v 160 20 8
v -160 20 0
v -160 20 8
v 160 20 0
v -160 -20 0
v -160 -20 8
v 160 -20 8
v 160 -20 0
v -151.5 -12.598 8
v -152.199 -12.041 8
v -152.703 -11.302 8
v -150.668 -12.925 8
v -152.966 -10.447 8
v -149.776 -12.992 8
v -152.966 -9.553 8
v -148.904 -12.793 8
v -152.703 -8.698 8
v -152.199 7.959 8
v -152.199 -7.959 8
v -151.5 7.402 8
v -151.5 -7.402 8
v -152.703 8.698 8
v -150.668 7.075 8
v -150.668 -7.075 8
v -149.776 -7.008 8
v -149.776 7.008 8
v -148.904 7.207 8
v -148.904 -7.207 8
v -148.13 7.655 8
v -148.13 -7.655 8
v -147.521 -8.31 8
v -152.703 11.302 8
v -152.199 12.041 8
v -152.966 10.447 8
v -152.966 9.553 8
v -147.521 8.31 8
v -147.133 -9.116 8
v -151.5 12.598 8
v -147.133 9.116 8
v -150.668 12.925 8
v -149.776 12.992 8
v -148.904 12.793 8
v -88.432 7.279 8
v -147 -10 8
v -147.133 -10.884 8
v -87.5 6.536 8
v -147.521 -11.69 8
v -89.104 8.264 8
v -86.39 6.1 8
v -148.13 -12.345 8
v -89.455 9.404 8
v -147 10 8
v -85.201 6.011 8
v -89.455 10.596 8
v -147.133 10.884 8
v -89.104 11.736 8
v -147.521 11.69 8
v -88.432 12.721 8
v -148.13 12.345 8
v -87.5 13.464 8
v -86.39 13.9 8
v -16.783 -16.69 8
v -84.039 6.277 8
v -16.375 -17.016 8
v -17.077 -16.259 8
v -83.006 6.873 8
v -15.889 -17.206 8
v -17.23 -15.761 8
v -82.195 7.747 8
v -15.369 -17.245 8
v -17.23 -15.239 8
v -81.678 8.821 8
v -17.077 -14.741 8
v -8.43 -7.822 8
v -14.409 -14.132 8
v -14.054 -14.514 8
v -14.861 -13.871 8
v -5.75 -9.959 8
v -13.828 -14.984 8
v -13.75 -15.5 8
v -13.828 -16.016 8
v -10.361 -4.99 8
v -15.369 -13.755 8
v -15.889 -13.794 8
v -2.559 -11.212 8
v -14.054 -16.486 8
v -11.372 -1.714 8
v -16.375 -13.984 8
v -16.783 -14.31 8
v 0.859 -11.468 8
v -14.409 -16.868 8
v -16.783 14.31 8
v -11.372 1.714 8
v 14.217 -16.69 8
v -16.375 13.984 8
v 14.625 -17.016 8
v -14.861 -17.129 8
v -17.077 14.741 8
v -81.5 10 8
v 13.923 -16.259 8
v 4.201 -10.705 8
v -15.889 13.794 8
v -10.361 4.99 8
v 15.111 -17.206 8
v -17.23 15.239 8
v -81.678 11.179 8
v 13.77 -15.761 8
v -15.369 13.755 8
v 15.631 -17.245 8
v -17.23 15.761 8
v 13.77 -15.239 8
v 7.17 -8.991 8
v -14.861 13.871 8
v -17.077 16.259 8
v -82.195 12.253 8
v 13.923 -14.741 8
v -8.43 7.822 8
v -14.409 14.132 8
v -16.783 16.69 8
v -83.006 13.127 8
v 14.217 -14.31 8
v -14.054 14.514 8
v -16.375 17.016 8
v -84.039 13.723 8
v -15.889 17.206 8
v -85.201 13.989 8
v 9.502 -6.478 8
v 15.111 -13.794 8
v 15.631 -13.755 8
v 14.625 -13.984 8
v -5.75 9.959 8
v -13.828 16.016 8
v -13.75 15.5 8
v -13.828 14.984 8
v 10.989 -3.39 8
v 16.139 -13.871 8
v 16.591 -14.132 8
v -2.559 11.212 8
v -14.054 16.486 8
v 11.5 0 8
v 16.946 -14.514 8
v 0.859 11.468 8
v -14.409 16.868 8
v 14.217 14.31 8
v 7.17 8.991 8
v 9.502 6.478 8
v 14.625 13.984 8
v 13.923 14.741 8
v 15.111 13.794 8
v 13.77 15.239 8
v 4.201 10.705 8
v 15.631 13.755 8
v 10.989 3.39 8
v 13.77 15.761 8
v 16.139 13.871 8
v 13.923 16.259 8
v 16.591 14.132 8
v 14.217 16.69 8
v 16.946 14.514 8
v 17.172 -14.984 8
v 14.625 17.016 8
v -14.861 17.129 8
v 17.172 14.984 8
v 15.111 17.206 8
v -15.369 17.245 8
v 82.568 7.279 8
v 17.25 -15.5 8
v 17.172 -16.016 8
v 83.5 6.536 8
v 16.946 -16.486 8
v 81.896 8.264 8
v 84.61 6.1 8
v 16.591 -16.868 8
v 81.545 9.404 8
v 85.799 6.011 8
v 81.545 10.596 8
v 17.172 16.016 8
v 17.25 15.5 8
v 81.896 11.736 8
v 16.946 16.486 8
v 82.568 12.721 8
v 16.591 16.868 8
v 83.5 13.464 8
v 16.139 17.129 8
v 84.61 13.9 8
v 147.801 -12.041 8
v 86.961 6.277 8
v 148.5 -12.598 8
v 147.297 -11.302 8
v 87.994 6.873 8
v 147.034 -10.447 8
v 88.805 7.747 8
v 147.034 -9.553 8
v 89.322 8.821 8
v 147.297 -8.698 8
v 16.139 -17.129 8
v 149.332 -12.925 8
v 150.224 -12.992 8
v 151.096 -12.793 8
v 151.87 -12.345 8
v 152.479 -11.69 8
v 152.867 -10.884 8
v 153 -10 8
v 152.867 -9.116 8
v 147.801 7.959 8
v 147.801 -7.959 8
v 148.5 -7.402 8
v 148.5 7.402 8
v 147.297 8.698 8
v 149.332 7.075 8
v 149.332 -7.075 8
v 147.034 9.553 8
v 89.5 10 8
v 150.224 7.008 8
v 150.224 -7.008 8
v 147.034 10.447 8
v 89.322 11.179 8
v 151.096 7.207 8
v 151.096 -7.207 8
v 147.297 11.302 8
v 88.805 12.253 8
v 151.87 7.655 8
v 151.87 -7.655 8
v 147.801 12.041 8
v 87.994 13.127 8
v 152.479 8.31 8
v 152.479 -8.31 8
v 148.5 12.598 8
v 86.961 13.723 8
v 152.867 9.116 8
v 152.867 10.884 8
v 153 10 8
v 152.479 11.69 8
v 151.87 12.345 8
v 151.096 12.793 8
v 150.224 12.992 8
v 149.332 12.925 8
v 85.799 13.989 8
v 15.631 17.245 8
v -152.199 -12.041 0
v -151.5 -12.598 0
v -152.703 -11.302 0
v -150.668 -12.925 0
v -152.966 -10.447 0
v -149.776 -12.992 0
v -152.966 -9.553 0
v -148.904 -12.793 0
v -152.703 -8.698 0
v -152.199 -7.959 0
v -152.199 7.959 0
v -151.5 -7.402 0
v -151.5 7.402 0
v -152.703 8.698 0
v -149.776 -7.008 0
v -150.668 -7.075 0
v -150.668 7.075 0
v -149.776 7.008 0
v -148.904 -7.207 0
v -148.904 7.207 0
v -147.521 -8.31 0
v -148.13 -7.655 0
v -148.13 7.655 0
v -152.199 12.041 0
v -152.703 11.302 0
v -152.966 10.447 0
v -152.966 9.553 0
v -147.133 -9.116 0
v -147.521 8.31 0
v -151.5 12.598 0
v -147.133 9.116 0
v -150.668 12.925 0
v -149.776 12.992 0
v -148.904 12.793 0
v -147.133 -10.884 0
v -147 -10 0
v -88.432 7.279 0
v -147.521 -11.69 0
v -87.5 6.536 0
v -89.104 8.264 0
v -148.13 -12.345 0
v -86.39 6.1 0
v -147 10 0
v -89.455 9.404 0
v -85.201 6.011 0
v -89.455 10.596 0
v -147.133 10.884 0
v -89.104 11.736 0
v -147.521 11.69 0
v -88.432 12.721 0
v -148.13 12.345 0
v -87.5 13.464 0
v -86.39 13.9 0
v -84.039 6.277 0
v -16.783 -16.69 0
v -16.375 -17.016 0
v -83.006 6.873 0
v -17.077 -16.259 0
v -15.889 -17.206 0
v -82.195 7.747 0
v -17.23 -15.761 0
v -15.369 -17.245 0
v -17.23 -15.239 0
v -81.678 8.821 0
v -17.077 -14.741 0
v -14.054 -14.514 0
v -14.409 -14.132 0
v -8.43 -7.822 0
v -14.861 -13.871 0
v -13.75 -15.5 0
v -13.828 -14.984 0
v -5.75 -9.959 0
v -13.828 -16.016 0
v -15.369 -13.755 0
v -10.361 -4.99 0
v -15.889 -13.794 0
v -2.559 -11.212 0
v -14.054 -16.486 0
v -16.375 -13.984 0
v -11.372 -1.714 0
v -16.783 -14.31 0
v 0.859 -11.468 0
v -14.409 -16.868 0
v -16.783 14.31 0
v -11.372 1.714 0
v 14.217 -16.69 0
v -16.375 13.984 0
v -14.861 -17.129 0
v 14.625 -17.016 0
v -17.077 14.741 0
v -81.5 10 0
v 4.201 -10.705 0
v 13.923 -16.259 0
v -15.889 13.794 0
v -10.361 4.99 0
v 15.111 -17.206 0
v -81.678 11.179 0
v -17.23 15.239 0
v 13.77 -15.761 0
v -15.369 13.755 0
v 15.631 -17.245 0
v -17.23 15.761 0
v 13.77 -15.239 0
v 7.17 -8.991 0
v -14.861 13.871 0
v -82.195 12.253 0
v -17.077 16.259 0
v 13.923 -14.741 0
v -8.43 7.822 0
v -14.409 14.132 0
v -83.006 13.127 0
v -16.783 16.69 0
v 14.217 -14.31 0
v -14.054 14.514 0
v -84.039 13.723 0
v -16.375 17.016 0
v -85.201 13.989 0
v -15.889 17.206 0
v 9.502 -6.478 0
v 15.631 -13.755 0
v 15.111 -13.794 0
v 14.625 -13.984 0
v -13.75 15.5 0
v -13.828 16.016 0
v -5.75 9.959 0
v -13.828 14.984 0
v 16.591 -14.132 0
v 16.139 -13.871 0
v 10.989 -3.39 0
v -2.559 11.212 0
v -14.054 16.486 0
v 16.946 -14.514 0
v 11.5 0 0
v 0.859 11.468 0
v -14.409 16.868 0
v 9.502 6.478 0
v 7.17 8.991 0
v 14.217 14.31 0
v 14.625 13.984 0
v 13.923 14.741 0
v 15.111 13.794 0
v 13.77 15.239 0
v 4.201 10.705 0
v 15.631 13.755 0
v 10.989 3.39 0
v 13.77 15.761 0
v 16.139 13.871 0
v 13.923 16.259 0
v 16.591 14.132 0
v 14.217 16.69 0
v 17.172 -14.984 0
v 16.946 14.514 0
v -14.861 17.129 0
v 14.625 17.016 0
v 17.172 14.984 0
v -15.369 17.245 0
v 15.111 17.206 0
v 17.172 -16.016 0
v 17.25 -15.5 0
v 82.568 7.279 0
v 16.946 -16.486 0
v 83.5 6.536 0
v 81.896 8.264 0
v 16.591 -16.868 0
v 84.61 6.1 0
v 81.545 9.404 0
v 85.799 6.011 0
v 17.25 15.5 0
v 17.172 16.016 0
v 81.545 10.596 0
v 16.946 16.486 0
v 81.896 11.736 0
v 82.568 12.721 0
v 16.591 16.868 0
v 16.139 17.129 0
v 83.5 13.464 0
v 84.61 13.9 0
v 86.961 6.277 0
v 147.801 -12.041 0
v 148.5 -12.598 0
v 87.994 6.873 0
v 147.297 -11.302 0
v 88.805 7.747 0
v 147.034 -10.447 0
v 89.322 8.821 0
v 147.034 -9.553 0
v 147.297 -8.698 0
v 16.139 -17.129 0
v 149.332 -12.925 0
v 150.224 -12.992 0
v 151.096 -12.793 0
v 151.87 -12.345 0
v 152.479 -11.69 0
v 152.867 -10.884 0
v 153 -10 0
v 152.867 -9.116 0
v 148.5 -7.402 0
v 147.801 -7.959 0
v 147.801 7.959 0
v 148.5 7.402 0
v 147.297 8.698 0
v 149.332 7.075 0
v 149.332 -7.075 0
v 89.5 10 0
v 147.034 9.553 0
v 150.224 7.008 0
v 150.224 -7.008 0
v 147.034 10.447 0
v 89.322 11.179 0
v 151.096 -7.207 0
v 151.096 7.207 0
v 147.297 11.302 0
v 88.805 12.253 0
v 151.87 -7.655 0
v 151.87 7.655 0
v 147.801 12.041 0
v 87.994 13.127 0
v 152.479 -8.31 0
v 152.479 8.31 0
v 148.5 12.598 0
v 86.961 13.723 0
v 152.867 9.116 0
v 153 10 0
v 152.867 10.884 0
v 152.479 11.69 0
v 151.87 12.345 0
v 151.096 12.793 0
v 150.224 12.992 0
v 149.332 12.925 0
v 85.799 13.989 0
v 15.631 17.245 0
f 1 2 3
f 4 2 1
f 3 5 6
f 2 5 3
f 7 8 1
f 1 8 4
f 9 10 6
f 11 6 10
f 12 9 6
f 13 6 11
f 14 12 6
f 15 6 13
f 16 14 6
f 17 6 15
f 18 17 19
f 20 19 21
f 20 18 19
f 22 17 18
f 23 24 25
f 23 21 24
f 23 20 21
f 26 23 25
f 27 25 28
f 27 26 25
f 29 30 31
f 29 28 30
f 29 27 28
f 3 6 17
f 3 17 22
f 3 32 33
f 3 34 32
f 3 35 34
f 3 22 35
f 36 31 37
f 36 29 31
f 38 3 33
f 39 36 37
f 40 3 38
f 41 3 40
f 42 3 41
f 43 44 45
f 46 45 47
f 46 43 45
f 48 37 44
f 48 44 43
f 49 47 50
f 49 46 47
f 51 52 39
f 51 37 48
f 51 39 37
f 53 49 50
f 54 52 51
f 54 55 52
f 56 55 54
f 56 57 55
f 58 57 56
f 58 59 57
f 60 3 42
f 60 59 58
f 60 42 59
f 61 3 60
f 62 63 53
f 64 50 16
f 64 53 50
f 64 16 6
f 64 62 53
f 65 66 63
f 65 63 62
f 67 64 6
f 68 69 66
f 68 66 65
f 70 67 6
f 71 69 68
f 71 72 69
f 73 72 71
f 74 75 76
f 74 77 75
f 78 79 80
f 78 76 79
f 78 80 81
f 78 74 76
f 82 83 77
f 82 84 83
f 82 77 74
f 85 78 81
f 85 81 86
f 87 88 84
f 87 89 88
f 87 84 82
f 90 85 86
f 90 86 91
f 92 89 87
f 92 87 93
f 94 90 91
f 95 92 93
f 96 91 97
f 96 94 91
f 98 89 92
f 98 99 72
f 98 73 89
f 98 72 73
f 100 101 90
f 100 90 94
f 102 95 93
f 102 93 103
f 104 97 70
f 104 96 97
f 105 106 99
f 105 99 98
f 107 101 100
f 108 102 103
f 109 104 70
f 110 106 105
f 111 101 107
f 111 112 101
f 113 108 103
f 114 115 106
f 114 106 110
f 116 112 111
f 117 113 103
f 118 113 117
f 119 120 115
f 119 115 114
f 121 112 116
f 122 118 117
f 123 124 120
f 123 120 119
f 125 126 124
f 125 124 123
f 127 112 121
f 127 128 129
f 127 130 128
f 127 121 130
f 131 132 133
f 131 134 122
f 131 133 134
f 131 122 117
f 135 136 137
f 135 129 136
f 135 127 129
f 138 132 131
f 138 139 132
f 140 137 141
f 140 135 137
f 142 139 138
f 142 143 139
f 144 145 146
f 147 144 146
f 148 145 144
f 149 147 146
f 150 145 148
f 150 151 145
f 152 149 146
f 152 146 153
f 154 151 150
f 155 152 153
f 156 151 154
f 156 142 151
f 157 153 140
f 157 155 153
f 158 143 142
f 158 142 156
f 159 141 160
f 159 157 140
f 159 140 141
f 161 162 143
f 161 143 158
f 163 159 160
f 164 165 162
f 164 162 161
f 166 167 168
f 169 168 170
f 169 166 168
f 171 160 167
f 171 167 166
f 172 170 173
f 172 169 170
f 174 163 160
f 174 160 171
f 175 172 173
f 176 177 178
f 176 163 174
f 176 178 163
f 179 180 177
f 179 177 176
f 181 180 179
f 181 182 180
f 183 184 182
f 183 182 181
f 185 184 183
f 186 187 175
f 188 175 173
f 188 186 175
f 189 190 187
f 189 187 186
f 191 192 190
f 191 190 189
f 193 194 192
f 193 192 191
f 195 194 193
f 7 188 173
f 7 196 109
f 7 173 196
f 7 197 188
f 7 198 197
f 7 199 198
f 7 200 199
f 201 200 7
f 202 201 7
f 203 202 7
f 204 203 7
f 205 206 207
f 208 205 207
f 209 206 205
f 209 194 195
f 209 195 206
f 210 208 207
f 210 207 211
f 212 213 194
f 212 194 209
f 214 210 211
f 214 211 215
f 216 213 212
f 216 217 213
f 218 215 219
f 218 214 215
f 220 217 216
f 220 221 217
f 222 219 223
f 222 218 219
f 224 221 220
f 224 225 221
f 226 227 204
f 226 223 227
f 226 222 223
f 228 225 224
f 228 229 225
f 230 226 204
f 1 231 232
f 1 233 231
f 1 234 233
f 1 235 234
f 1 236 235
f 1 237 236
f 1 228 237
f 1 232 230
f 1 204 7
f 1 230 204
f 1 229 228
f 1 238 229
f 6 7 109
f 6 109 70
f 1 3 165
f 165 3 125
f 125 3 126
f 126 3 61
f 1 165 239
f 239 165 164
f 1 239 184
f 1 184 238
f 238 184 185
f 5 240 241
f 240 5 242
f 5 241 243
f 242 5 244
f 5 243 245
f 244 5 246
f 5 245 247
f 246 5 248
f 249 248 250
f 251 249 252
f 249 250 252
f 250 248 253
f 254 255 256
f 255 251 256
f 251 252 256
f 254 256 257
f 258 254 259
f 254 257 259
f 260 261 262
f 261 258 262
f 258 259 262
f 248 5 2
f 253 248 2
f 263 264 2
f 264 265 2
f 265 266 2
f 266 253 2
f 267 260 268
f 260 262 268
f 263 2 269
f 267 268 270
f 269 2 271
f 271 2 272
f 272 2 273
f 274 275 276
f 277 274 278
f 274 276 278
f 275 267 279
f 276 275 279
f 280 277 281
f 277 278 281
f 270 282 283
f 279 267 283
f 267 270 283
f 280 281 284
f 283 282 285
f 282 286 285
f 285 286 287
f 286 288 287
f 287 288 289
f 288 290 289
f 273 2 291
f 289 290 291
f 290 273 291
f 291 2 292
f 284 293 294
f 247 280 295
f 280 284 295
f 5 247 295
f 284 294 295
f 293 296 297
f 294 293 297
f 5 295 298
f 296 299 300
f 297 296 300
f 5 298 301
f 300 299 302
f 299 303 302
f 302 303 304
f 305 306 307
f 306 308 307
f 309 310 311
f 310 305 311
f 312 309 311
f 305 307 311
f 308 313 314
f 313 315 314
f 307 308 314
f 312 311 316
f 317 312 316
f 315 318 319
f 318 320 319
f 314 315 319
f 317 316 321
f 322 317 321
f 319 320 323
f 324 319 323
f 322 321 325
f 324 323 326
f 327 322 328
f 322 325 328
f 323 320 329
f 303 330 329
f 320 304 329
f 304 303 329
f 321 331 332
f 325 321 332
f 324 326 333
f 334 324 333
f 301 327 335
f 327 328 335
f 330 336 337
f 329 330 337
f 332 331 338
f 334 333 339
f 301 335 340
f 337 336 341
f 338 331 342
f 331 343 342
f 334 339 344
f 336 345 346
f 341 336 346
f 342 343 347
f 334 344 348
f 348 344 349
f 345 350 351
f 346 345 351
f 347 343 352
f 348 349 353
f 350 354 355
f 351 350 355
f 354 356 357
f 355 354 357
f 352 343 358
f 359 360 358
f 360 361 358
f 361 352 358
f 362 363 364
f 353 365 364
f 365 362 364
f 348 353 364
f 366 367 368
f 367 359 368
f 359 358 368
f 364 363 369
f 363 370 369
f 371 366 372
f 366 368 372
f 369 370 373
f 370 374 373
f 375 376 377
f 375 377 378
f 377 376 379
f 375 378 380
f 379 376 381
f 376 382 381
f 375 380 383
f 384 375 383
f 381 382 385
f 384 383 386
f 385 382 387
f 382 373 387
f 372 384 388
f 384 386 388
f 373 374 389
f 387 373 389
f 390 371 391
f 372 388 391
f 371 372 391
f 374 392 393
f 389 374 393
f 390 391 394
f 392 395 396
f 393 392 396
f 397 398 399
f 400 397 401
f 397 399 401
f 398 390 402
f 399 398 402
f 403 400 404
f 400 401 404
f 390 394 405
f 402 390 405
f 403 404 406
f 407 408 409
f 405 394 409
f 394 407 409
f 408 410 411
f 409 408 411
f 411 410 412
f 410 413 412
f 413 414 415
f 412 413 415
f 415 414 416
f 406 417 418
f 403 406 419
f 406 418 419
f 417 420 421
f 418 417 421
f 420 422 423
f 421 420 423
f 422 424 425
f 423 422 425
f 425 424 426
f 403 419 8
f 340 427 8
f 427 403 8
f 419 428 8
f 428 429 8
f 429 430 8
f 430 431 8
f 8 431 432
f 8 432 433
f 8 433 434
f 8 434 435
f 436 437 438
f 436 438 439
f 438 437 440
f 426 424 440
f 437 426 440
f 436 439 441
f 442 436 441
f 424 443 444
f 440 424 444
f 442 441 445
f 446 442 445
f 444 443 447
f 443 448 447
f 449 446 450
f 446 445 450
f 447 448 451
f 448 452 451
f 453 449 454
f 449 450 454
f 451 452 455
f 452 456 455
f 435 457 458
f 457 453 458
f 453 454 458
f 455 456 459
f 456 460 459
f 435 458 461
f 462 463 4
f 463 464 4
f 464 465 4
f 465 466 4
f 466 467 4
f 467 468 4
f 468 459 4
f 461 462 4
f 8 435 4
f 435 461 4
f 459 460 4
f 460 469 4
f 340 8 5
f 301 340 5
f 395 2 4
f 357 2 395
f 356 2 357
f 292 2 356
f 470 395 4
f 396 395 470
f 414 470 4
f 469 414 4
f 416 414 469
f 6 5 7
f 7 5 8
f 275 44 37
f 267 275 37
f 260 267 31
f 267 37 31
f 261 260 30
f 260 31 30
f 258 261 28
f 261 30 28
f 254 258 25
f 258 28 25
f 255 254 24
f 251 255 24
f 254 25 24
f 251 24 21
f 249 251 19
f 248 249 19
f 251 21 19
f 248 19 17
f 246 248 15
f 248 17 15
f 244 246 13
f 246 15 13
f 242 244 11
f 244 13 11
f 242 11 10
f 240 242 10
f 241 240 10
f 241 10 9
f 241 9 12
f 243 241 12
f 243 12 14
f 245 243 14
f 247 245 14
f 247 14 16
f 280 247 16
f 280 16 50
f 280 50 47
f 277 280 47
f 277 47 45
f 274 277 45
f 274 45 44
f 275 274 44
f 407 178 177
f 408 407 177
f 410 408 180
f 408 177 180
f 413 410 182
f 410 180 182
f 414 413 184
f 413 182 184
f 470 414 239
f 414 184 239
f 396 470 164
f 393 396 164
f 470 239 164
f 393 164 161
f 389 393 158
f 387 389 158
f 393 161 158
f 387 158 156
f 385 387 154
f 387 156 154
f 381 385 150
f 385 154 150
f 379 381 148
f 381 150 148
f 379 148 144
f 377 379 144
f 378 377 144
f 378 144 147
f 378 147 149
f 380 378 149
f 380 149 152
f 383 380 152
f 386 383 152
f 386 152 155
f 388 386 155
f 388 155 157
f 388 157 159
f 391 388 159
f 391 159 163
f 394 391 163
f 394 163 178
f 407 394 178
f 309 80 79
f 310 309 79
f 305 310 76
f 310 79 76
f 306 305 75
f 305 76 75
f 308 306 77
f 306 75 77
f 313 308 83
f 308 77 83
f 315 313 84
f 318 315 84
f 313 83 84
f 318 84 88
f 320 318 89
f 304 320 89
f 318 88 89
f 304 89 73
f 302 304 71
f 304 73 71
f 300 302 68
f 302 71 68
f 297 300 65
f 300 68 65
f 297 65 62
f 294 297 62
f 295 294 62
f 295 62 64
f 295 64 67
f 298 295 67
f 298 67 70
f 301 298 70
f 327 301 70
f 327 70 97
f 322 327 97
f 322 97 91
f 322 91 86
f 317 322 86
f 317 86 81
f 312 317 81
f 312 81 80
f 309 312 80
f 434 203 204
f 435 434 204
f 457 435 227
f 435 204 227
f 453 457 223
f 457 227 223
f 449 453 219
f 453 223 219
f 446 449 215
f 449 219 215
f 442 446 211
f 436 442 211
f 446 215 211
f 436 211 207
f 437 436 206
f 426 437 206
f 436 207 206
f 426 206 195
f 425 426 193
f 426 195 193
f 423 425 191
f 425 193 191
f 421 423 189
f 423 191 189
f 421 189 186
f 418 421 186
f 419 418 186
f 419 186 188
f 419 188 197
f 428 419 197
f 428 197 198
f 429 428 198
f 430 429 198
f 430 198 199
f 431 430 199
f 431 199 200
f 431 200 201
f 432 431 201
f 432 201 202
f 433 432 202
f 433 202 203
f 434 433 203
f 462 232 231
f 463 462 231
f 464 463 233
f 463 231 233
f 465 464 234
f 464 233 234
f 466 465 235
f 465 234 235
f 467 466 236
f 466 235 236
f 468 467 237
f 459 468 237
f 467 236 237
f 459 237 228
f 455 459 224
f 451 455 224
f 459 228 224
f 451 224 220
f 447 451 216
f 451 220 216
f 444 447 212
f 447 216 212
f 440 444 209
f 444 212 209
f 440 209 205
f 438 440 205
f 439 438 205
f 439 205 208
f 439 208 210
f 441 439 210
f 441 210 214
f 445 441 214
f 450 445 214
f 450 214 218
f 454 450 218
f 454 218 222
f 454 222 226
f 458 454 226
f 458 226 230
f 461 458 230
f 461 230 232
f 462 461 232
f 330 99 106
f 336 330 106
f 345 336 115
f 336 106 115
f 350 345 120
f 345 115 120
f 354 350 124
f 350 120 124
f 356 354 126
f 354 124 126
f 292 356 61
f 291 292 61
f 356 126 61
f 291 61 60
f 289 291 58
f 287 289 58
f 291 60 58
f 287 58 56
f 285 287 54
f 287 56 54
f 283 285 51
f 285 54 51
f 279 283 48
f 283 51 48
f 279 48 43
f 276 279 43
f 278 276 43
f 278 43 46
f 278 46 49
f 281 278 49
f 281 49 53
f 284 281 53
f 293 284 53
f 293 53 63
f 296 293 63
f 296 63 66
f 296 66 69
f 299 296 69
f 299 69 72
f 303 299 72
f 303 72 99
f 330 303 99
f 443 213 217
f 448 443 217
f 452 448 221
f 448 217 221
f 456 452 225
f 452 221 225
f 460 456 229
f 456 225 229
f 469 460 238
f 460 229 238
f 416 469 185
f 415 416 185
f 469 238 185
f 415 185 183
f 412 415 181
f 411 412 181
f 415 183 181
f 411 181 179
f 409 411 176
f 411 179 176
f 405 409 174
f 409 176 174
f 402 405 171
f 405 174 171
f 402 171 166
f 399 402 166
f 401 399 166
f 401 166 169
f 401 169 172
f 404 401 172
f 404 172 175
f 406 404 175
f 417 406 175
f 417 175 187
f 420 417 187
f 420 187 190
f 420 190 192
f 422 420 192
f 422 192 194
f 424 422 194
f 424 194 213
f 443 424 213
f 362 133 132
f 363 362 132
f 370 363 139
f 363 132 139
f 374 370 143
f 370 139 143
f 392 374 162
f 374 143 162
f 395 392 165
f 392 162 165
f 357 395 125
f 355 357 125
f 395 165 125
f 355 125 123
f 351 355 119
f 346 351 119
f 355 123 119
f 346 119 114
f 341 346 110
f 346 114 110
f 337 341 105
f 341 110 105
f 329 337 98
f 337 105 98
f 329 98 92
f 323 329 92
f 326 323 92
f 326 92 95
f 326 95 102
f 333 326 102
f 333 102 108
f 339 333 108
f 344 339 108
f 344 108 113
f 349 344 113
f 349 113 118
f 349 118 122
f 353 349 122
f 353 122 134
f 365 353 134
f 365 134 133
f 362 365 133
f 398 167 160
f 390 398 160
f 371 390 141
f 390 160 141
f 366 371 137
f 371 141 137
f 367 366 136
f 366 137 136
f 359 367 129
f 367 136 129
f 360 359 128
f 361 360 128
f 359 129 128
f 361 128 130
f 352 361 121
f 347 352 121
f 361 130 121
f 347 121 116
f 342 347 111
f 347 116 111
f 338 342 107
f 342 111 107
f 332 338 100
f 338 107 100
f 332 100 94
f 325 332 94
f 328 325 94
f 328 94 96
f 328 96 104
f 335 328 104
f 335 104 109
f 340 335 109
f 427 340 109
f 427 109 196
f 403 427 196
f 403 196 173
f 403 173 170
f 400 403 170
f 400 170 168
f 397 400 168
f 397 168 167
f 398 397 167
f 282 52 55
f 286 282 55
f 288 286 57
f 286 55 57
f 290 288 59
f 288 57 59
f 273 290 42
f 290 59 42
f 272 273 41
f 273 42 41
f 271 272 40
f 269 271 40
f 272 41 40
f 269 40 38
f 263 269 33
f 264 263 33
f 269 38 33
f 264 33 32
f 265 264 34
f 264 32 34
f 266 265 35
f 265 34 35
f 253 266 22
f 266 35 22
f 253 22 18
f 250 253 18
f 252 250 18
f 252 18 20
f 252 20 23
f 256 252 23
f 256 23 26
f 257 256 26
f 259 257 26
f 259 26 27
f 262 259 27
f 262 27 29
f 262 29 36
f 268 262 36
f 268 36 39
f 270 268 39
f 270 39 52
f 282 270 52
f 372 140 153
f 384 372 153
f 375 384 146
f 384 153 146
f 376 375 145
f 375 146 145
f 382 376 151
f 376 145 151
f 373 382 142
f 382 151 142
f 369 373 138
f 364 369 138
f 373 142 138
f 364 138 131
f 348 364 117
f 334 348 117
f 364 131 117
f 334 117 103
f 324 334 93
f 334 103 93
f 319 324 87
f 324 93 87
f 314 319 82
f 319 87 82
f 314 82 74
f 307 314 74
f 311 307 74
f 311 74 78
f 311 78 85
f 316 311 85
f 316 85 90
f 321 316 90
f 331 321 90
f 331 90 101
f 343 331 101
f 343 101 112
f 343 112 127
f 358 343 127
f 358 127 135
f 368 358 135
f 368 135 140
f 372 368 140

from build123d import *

# Parameters (mm, degrees)
SKETCH1_W           = 320
SKETCH1_H           = 40
BOSS_EXTRUDE1_DEPTH = 8
CUT_EXTRUDE1_REACH  = 10
SKETCH2_R           = 3
CUT_EXTRUDE2_REACH  = 10
SKETCH3_R           = 4
SKETCH3_R_2         = 11.5
CUT_EXTRUDE3_REACH  = 10
SKETCH4_R           = 1.75


with BuildPart() as part:
    # Sketch1 → Boss-Extrude1 (new body)
    with BuildSketch(Plane.XY):
        Rectangle(SKETCH1_W, SKETCH1_H)
    extrude(amount=BOSS_EXTRUDE1_DEPTH)

    # Sketch2 → Cut-Extrude1 (cut, up to next)
    with BuildSketch(Plane.XY.offset(8), mode=Mode.PRIVATE) as cut_extrude1_sk1:
        with Locations((-150, 10)):
            Circle(SKETCH2_R)
    cut_extrude1_tool1 = extrude(cut_extrude1_sk1.sketch, amount=-CUT_EXTRUDE1_REACH, mode=Mode.PRIVATE) & part.part
    add(cut_extrude1_tool1.solids().sort_by_distance((-150, 10, 8))[0], mode=Mode.SUBTRACT)
    # Sketch2 → Cut-Extrude1 (cut, up to next)
    with BuildSketch(Plane.XY.offset(8), mode=Mode.PRIVATE) as cut_extrude1_sk2:
        with Locations((-150, -10)):
            Circle(SKETCH2_R)
    cut_extrude1_tool2 = extrude(cut_extrude1_sk2.sketch, amount=-CUT_EXTRUDE1_REACH, mode=Mode.PRIVATE) & part.part
    add(cut_extrude1_tool2.solids().sort_by_distance((-150, -10, 8))[0], mode=Mode.SUBTRACT)
    # Sketch2 → Cut-Extrude1 (cut, up to next)
    with BuildSketch(Plane.XY.offset(8), mode=Mode.PRIVATE) as cut_extrude1_sk3:
        with Locations((150, -10)):
            Circle(SKETCH2_R)
    cut_extrude1_tool3 = extrude(cut_extrude1_sk3.sketch, amount=-CUT_EXTRUDE1_REACH, mode=Mode.PRIVATE) & part.part
    add(cut_extrude1_tool3.solids().sort_by_distance((150, -10, 8))[0], mode=Mode.SUBTRACT)
    # Sketch2 → Cut-Extrude1 (cut, up to next)
    with BuildSketch(Plane.XY.offset(8), mode=Mode.PRIVATE) as cut_extrude1_sk4:
        with Locations((150, 10)):
            Circle(SKETCH2_R)
    cut_extrude1_tool4 = extrude(cut_extrude1_sk4.sketch, amount=-CUT_EXTRUDE1_REACH, mode=Mode.PRIVATE) & part.part
    add(cut_extrude1_tool4.solids().sort_by_distance((150, 10, 8))[0], mode=Mode.SUBTRACT)

    # Sketch3 → Cut-Extrude2 (cut, up to next)
    with BuildSketch(Plane.XY.offset(8), mode=Mode.PRIVATE) as cut_extrude2_sk1:
        with Locations((-85.5, 10)):
            Circle(SKETCH3_R)
    cut_extrude2_tool1 = extrude(cut_extrude2_sk1.sketch, amount=-CUT_EXTRUDE2_REACH, mode=Mode.PRIVATE) & part.part
    add(cut_extrude2_tool1.solids().sort_by_distance((-85.5, 10, 8))[0], mode=Mode.SUBTRACT)
    # Sketch3 → Cut-Extrude2 (cut, up to next)
    with BuildSketch(Plane.XY.offset(8), mode=Mode.PRIVATE) as cut_extrude2_sk2:
        with Locations((85.5, 10)):
            Circle(SKETCH3_R)
    cut_extrude2_tool2 = extrude(cut_extrude2_sk2.sketch, amount=-CUT_EXTRUDE2_REACH, mode=Mode.PRIVATE) & part.part
    add(cut_extrude2_tool2.solids().sort_by_distance((85.5, 10, 8))[0], mode=Mode.SUBTRACT)
    # Sketch3 → Cut-Extrude2 (cut, up to next)
    with BuildSketch(Plane.XY.offset(8), mode=Mode.PRIVATE) as cut_extrude2_sk3:
        Circle(SKETCH3_R_2)
    cut_extrude2_tool3 = extrude(cut_extrude2_sk3.sketch, amount=-CUT_EXTRUDE2_REACH, mode=Mode.PRIVATE) & part.part
    add(cut_extrude2_tool3.solids().sort_by_distance((0, 0, 8))[0], mode=Mode.SUBTRACT)

    # Sketch4 → Cut-Extrude3 (cut, up to next)
    with BuildSketch(Plane.XY.offset(8), mode=Mode.PRIVATE) as cut_extrude3_sk1:
        with Locations((-15.5, 15.5)):
            Circle(SKETCH4_R)
    cut_extrude3_tool1 = extrude(cut_extrude3_sk1.sketch, amount=-CUT_EXTRUDE3_REACH, mode=Mode.PRIVATE) & part.part
    add(cut_extrude3_tool1.solids().sort_by_distance((-15.5, 15.5, 8))[0], mode=Mode.SUBTRACT)
    # Sketch4 → Cut-Extrude3 (cut, up to next)
    with BuildSketch(Plane.XY.offset(8), mode=Mode.PRIVATE) as cut_extrude3_sk2:
        with Locations((15.5, 15.5)):
            Circle(SKETCH4_R)
    cut_extrude3_tool2 = extrude(cut_extrude3_sk2.sketch, amount=-CUT_EXTRUDE3_REACH, mode=Mode.PRIVATE) & part.part
    add(cut_extrude3_tool2.solids().sort_by_distance((15.5, 15.5, 8))[0], mode=Mode.SUBTRACT)
    # Sketch4 → Cut-Extrude3 (cut, up to next)
    with BuildSketch(Plane.XY.offset(8), mode=Mode.PRIVATE) as cut_extrude3_sk3:
        with Locations((-15.5, -15.5)):
            Circle(SKETCH4_R)
    cut_extrude3_tool3 = extrude(cut_extrude3_sk3.sketch, amount=-CUT_EXTRUDE3_REACH, mode=Mode.PRIVATE) & part.part
    add(cut_extrude3_tool3.solids().sort_by_distance((-15.5, -15.5, 8))[0], mode=Mode.SUBTRACT)
    # Sketch4 → Cut-Extrude3 (cut, up to next)
    with BuildSketch(Plane.XY.offset(8), mode=Mode.PRIVATE) as cut_extrude3_sk4:
        with Locations((15.5, -15.5)):
            Circle(SKETCH4_R)
    cut_extrude3_tool4 = extrude(cut_extrude3_sk4.sketch, amount=-CUT_EXTRUDE3_REACH, mode=Mode.PRIVATE) & part.part
    add(cut_extrude3_tool4.solids().sort_by_distance((15.5, -15.5, 8))[0], mode=Mode.SUBTRACT)


solid = part.part
